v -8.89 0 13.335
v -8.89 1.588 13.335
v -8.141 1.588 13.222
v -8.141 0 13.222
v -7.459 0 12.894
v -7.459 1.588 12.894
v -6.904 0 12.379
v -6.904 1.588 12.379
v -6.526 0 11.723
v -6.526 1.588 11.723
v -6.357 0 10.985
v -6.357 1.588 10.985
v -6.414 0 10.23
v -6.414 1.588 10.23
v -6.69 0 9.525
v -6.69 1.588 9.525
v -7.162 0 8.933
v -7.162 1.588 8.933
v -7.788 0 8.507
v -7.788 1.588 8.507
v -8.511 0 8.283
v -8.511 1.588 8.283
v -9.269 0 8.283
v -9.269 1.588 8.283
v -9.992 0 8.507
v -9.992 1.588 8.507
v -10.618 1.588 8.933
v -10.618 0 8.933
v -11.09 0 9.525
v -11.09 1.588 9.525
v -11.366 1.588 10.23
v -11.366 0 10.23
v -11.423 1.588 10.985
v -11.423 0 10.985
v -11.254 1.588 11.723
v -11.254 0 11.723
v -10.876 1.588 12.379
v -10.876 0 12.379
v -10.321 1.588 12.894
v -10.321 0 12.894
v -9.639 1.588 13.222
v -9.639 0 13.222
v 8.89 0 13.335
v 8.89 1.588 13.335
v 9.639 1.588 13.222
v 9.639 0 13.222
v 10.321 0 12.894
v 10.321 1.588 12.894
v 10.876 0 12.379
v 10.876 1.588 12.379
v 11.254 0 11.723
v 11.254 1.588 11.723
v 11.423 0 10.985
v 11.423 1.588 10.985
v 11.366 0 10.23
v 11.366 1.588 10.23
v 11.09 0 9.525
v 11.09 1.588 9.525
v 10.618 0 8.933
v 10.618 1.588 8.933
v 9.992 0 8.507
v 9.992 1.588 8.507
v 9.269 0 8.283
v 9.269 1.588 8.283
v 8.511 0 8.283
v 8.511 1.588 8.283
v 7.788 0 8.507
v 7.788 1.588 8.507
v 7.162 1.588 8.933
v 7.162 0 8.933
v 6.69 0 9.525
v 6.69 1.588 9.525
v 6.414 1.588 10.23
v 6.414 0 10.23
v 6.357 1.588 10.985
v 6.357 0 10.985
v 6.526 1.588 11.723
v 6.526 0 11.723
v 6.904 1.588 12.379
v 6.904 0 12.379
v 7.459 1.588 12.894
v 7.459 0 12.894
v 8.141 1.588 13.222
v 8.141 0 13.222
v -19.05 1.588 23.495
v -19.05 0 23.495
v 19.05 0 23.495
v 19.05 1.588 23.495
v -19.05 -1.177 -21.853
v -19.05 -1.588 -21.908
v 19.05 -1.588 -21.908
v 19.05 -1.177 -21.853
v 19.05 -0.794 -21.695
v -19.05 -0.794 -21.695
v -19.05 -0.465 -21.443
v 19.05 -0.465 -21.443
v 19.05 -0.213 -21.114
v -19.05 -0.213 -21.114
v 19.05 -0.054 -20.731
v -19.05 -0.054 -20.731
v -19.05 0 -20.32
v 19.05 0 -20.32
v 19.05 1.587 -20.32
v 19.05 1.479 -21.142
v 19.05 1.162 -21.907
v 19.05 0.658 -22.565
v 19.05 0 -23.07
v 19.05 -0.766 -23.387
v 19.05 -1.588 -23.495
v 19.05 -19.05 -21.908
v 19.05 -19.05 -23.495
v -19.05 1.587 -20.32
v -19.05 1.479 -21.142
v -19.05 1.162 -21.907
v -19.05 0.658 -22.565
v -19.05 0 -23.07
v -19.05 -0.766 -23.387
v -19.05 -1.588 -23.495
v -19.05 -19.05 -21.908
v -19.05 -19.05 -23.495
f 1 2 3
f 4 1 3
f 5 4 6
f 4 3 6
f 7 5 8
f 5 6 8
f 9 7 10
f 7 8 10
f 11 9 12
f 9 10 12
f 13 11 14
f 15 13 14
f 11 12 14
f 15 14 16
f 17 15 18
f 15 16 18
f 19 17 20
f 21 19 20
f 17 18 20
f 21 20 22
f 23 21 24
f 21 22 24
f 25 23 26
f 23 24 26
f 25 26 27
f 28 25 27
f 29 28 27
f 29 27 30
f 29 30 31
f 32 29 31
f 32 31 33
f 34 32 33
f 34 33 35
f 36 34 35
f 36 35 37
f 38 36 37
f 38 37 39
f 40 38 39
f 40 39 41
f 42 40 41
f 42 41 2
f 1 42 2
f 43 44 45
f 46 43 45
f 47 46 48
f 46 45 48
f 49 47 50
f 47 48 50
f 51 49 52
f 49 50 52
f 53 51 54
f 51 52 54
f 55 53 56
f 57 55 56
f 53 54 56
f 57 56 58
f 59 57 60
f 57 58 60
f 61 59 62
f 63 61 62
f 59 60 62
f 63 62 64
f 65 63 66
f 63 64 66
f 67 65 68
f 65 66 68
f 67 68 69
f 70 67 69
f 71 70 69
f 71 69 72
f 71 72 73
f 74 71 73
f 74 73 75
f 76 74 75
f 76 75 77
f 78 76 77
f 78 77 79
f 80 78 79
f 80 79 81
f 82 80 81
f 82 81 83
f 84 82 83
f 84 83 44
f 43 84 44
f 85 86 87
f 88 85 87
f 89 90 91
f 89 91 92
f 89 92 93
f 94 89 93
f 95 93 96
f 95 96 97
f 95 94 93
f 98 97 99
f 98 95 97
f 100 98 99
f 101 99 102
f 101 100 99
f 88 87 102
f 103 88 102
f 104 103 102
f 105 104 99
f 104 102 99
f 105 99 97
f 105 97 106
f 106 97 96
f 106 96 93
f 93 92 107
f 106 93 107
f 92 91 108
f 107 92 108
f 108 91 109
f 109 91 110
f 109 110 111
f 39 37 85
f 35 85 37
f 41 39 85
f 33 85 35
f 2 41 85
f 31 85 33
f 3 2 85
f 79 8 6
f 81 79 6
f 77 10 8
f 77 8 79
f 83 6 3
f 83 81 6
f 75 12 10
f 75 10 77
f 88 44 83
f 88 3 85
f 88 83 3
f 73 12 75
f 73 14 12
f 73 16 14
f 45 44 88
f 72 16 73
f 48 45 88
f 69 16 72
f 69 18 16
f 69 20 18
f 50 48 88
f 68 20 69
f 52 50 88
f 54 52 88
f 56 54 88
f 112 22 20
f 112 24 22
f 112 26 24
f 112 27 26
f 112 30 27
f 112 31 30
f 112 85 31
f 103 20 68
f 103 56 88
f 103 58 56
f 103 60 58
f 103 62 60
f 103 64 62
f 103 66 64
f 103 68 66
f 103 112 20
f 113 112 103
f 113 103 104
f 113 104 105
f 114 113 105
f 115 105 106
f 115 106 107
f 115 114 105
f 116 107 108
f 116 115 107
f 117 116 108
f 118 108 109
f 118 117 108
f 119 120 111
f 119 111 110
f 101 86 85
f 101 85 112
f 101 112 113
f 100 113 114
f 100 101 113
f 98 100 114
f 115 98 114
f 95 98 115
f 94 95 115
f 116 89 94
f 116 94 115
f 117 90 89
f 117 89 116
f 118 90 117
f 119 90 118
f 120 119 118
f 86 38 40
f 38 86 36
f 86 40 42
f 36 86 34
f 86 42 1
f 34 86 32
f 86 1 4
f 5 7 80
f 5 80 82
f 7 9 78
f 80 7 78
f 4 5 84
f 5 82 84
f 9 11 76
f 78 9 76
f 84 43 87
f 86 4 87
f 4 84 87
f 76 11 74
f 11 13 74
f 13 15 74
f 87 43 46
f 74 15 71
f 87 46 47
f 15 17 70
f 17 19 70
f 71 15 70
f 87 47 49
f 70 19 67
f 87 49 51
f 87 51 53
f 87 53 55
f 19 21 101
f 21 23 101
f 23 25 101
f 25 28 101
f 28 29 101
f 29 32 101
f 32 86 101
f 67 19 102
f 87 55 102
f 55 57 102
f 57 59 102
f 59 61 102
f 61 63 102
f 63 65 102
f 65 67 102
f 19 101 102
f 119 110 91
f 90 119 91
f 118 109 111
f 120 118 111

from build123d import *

# Parameters (mm, degrees)
SKETCH1_W                    = 38.1
SKETCH1_H                    = 46.99
BOSS_EXTRUDE1_DEPTH          = 1.5875
EDGE_FLANGE1_STRIP_W         = 9.525
EDGE_FLANGE1_STRIP_H         = 1.5875
EDGE_FLANGE1_STRIP_CUT_DEPTH = 38.1
EDGE_FLANGE1_DEPTH           = 38.1
SKETCH13_R                   = 2.54
CUT_EXTRUDE1_DEPTH           = 25.4


# Sheet-metal steps are written as plain solids
with BuildPart() as part:
    # Sketch1 → Boss-Extrude1 (new body)
    with BuildSketch(Plane(origin=(0, 0, 0), x_dir=(1, 0, 0), z_dir=(0, 1, 0))):
        Rectangle(SKETCH1_W, SKETCH1_H)
    extrude(amount=BOSS_EXTRUDE1_DEPTH)

    # Edge-Flange1 strip (across the edge) → Edge-Flange1 strip cut (cut)
    with BuildSketch(Plane(origin=(-19.05, 0, -23.495), x_dir=(0, 0, 1), z_dir=(1, 0, 0))):
        with Locations((-1.5875, -0.79375)):
            Rectangle(EDGE_FLANGE1_STRIP_W, EDGE_FLANGE1_STRIP_H)
    extrude(amount=EDGE_FLANGE1_STRIP_CUT_DEPTH, mode=Mode.SUBTRACT)

    # Edge-Flange1 section (across the edge) → Edge-Flange1 (add)
    with BuildSketch(Plane(origin=(-19.05, 0, -23.495), x_dir=(0, 0, 1), z_dir=(1, 0, 0))):
        with BuildLine():
            Line((0, 1.5875), (0, 19.05))
            Line((0, 19.05), (1.5875, 19.05))
            Line((1.5875, 19.05), (1.5875, 1.5875))
            ThreePointArc((1.5875, 1.5875), (2.052467985, 0.464967985), (3.175, 0))
            Line((3.175, 0), (3.175, -1.5875))
            ThreePointArc((3.175, -1.5875), (0.92993597, -0.65756403), (0, 1.5875))
        make_face()
    extrude(amount=EDGE_FLANGE1_DEPTH)

    # Sketch13 → Cut-Extrude1 (cut)
    with BuildSketch(Plane(origin=(0, 1.5875, 0), x_dir=(1, 0, 0), z_dir=(0, 1, 0))):
        with Locations(Location((8.89, -10.795, 0), (0, 0, 270))):
            Circle(SKETCH13_R)
        with Locations(Location((-8.89, -10.795, 0), (0, 0, 270))):
            Circle(SKETCH13_R)
    extrude(amount=-CUT_EXTRUDE1_DEPTH, mode=Mode.SUBTRACT)


solid = part.part
